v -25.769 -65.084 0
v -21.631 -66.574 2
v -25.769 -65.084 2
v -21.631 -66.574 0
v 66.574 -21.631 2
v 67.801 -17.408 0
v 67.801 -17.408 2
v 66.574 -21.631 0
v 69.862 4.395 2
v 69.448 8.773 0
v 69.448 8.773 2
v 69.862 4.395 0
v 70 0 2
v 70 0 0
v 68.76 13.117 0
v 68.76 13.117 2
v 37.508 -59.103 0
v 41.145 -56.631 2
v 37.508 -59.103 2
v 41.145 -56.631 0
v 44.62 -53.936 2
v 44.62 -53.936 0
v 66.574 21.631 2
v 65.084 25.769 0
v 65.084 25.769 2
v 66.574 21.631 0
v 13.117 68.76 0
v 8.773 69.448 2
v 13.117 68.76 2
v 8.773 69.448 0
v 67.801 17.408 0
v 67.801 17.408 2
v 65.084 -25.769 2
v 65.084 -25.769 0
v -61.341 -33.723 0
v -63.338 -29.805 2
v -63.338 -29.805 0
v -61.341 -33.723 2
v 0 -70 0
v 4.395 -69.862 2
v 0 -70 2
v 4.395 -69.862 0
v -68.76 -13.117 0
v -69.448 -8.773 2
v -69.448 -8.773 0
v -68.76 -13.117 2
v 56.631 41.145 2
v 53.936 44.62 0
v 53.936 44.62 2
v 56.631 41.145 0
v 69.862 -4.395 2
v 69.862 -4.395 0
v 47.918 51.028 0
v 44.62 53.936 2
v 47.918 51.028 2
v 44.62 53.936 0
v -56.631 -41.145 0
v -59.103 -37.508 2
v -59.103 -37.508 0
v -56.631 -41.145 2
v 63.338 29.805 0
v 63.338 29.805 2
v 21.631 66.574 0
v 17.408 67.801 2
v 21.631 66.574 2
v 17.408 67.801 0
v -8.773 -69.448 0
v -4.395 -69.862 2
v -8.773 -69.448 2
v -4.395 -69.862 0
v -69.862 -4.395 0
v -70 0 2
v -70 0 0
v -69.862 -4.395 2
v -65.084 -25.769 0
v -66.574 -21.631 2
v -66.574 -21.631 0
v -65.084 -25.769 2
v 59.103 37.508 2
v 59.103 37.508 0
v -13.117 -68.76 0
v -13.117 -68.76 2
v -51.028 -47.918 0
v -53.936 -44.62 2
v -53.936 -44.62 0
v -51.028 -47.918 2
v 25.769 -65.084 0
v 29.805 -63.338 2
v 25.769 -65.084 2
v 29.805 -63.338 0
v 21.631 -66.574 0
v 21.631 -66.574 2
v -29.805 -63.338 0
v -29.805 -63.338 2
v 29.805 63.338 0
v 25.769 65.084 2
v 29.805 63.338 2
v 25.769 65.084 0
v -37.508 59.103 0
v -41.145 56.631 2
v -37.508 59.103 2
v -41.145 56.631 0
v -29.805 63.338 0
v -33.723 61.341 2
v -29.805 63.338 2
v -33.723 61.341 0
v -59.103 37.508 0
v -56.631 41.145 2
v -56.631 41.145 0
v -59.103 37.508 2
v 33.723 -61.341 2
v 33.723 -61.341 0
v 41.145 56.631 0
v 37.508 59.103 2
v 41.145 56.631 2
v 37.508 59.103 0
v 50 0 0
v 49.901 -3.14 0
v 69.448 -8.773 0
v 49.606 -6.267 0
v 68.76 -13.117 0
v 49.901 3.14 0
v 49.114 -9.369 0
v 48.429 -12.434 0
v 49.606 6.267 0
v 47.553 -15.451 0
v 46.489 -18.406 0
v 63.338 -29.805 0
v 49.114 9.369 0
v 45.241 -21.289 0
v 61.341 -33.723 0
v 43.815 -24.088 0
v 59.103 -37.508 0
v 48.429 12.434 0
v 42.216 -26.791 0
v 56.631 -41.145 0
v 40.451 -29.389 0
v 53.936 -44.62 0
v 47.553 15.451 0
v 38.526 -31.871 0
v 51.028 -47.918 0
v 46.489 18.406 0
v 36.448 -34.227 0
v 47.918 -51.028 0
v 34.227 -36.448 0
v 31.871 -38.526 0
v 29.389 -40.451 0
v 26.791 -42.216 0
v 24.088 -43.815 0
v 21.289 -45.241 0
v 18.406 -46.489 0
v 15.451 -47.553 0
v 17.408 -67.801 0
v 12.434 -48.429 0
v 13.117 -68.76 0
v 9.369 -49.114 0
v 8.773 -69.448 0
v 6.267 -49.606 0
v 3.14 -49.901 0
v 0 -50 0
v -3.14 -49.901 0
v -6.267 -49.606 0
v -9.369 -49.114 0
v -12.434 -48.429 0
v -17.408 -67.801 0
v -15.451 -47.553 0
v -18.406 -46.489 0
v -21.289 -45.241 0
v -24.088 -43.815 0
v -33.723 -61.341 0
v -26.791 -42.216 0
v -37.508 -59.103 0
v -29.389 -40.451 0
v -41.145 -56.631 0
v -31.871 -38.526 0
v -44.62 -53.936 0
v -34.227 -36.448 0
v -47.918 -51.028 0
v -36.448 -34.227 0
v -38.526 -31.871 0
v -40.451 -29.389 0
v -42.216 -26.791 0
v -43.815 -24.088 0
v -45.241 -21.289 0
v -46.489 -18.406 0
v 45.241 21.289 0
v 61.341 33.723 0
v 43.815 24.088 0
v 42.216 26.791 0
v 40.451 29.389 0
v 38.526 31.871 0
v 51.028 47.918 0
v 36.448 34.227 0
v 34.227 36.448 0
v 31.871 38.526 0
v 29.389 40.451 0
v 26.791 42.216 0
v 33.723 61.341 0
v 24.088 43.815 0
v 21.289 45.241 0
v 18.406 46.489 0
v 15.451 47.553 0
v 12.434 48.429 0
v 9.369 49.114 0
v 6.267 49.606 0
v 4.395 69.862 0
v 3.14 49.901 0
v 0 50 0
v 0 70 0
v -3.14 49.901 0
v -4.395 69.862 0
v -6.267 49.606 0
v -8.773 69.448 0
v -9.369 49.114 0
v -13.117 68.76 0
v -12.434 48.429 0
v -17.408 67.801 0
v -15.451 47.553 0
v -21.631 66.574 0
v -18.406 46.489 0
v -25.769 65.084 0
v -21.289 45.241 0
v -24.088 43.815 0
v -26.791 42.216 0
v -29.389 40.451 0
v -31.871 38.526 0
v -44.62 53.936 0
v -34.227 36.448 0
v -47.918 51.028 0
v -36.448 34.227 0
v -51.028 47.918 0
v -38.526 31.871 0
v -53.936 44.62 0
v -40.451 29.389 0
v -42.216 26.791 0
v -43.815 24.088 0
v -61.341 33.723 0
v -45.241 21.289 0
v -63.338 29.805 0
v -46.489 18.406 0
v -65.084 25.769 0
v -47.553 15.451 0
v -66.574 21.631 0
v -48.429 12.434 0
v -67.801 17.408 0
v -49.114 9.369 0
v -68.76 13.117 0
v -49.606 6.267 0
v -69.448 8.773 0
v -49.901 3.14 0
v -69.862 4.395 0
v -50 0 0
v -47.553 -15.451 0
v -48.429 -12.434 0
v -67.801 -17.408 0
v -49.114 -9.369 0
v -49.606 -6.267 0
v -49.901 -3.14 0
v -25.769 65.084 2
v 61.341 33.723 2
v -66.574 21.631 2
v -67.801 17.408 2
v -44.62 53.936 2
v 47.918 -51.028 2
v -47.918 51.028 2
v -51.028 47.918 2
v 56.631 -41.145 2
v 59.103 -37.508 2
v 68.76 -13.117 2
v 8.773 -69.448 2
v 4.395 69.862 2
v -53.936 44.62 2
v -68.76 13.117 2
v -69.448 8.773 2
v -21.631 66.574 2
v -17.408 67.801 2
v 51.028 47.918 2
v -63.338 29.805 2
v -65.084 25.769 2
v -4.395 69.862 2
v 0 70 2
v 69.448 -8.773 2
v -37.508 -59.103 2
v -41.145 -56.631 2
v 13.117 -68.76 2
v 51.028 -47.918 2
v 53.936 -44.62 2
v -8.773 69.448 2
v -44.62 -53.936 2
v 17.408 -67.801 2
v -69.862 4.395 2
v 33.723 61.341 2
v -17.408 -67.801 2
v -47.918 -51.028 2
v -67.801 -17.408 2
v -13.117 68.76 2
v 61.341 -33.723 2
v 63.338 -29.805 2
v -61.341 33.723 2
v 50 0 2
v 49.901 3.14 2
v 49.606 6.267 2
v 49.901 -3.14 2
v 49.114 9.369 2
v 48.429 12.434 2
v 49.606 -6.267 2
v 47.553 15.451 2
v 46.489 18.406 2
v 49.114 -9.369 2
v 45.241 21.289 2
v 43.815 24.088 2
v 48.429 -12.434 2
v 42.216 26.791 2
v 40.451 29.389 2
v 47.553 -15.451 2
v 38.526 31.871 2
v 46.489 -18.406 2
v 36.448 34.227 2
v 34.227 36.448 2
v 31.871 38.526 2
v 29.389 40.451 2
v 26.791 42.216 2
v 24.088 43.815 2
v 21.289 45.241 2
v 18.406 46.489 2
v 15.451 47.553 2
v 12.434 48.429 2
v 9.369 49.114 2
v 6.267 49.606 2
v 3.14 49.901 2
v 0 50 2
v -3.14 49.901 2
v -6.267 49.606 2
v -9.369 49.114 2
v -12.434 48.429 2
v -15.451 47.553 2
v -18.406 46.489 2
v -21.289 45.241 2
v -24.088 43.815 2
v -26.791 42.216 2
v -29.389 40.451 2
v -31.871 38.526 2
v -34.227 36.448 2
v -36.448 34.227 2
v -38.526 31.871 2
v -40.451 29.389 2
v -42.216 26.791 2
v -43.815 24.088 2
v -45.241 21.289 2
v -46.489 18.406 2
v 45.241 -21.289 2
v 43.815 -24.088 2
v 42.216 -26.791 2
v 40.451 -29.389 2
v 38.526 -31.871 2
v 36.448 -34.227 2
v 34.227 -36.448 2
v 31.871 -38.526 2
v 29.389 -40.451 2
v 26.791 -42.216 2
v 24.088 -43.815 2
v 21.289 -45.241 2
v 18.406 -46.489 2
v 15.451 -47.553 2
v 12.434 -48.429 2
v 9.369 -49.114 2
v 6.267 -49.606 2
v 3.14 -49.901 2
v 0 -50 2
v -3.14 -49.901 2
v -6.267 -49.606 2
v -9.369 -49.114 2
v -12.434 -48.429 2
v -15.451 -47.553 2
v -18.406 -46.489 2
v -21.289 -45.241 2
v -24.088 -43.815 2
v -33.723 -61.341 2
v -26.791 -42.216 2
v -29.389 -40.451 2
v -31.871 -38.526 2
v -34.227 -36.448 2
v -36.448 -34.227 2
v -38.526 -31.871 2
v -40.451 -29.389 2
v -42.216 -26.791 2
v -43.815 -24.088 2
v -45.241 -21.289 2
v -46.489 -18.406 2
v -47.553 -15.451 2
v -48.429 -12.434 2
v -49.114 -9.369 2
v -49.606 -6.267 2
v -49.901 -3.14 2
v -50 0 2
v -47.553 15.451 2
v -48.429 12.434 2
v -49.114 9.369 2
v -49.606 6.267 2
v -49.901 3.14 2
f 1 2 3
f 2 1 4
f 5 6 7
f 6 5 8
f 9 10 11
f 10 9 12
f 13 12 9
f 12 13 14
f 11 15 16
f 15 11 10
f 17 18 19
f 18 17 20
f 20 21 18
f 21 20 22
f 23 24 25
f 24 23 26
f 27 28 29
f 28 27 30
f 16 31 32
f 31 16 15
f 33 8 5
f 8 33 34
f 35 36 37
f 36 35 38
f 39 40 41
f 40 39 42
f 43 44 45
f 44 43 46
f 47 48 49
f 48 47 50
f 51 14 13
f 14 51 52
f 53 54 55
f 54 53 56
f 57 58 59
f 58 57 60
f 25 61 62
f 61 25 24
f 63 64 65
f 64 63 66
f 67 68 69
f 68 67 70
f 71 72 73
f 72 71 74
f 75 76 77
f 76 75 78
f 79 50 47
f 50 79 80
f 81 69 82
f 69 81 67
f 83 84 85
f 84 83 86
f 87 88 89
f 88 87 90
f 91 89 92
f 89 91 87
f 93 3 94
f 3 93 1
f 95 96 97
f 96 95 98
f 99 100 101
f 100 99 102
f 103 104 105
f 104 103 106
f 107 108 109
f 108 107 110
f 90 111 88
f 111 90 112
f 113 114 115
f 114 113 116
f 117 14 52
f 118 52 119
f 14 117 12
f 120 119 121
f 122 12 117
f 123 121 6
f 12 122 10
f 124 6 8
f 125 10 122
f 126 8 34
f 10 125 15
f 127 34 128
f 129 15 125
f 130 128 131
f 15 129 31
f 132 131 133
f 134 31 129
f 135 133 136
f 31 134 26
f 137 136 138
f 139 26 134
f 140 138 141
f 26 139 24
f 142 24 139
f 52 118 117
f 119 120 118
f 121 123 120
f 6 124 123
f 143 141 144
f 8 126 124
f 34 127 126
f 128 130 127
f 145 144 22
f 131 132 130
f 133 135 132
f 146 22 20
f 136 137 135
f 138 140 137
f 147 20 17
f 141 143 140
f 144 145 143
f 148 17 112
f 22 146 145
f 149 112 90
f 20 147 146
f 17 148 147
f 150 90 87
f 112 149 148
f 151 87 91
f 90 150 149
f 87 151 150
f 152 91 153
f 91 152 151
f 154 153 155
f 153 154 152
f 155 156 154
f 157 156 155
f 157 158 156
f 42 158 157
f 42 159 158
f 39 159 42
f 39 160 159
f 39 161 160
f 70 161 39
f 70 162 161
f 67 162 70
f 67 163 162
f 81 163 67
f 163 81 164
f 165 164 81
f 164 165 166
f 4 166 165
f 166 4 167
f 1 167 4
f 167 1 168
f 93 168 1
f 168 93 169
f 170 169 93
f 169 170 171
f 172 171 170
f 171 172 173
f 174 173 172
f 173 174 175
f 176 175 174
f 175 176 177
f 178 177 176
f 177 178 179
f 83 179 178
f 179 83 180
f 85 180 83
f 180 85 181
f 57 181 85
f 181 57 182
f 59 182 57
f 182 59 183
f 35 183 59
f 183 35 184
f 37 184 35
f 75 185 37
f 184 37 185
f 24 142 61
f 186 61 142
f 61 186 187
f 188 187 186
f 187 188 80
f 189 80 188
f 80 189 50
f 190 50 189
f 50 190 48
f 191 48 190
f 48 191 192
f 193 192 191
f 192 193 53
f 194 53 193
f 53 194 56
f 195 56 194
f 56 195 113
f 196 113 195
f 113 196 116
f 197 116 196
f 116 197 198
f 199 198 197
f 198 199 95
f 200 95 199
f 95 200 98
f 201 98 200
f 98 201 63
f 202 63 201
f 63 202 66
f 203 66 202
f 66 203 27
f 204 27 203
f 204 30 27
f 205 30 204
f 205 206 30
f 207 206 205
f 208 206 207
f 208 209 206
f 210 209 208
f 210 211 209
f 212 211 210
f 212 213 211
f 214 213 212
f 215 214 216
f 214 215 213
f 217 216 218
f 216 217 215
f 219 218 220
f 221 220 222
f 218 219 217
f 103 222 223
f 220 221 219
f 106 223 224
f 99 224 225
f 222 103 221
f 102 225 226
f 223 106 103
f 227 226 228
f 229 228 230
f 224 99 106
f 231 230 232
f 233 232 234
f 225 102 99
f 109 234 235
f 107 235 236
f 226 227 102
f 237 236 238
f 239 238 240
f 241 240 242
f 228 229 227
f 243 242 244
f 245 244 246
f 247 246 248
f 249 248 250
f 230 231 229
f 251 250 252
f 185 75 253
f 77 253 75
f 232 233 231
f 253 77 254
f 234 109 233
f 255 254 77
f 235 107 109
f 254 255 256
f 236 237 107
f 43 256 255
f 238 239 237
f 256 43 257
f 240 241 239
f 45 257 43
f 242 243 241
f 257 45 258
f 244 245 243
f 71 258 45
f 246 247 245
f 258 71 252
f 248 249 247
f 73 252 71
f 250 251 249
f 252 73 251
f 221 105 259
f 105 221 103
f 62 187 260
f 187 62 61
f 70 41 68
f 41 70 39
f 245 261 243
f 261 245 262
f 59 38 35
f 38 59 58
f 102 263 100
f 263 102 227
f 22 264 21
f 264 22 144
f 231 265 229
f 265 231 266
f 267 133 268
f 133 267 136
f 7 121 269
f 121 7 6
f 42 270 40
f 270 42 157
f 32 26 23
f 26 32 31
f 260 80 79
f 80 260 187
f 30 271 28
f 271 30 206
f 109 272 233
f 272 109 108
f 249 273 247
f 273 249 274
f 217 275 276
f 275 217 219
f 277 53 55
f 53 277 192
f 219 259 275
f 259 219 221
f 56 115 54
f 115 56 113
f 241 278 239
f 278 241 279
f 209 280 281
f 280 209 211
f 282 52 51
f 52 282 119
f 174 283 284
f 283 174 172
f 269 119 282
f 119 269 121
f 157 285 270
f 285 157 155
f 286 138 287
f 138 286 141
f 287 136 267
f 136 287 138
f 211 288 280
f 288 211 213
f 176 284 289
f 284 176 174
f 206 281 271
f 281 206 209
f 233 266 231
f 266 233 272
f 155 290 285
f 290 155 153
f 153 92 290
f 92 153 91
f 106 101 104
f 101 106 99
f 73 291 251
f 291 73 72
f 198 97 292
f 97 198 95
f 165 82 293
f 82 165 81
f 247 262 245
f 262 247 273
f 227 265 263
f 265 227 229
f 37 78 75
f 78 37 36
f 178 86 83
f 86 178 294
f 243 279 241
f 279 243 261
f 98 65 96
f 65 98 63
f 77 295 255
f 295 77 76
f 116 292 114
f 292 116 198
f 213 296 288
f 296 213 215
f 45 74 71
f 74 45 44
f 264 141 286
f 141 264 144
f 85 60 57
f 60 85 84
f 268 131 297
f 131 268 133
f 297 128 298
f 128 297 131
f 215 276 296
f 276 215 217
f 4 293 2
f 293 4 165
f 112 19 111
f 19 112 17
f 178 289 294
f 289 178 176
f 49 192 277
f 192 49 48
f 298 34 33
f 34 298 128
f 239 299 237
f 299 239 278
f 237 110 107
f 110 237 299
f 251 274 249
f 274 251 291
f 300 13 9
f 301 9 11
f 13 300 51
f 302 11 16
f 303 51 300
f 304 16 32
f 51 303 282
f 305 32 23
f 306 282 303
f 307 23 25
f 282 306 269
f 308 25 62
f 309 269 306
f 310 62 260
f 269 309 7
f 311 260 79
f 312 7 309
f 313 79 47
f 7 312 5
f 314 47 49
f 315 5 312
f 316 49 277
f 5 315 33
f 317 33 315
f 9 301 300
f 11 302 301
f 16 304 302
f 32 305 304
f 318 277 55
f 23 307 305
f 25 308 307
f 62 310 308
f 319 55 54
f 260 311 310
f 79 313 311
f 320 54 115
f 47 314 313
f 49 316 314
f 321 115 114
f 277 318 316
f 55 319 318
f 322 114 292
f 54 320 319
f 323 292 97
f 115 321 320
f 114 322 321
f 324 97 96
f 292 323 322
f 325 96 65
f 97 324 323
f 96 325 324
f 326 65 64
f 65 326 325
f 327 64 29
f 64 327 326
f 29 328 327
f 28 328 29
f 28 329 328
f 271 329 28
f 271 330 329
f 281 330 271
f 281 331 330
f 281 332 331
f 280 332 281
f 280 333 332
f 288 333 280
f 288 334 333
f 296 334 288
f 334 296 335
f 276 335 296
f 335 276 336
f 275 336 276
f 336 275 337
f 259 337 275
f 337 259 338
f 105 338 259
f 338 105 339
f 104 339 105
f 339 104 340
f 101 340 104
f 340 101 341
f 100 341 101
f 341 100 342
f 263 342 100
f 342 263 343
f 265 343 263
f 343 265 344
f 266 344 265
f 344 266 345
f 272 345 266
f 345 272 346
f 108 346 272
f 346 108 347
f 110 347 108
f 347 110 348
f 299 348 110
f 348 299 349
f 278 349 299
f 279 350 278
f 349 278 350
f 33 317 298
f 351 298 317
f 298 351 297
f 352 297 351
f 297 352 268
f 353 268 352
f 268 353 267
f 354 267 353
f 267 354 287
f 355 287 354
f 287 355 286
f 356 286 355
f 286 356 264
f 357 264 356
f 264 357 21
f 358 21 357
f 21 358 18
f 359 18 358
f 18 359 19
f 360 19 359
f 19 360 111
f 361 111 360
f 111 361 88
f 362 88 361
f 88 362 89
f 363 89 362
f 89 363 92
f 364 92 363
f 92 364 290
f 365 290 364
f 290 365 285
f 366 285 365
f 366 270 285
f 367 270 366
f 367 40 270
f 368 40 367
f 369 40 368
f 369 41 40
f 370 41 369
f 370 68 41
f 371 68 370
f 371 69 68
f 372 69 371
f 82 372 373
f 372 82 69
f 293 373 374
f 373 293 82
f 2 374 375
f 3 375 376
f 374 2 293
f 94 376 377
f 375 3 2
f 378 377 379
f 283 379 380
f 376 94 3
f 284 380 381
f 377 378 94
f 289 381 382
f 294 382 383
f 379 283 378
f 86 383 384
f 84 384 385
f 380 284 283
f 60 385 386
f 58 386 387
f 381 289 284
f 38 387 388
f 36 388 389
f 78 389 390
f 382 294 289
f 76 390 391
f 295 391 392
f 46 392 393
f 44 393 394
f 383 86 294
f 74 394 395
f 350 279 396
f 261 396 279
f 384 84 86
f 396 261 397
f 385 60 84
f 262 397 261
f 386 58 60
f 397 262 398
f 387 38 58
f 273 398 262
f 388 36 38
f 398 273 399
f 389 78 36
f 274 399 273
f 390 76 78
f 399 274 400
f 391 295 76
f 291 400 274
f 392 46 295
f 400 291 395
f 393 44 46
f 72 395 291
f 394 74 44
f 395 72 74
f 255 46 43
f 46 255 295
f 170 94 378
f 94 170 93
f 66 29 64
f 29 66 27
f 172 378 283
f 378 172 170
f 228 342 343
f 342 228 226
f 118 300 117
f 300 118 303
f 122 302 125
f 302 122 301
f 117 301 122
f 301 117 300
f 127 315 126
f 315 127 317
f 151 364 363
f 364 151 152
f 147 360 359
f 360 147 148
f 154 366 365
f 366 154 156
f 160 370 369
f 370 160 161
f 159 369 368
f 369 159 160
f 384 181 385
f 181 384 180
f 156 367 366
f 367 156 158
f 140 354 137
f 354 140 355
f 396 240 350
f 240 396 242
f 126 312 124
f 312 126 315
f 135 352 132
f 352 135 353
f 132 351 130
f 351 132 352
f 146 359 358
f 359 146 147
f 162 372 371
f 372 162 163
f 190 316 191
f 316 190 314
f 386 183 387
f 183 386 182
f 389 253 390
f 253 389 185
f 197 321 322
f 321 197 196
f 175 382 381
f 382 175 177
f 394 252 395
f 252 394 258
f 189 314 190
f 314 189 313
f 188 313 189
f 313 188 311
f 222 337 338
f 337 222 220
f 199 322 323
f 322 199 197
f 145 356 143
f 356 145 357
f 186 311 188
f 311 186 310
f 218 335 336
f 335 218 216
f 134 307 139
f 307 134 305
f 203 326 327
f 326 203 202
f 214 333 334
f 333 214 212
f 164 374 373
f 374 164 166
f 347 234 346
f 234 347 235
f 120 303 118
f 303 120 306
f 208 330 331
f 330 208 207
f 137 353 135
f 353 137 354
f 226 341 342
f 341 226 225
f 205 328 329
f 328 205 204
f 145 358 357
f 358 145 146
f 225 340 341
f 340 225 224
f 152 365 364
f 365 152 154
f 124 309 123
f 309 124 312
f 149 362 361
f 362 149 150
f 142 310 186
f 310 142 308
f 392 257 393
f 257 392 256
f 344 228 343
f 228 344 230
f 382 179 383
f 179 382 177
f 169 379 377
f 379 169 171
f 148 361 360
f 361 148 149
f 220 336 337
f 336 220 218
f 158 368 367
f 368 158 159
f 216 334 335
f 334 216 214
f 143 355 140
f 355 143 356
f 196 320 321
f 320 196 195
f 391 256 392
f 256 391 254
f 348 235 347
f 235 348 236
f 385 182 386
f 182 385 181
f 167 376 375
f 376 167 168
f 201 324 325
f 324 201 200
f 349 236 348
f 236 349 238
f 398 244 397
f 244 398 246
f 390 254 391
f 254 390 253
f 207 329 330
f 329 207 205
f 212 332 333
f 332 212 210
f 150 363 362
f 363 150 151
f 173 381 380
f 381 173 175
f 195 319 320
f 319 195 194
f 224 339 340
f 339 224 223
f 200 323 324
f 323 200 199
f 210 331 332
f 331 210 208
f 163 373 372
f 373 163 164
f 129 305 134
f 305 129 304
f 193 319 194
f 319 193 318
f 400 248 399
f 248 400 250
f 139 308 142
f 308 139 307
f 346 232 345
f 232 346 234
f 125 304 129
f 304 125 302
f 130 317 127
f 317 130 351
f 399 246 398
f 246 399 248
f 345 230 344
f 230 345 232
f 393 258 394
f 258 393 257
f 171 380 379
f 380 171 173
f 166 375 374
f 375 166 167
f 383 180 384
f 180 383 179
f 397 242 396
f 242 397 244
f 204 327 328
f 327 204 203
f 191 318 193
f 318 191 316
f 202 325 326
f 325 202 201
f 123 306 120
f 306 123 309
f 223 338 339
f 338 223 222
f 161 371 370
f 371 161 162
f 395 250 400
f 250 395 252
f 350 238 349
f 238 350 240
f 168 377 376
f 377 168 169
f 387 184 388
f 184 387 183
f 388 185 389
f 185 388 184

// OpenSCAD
//Weighted ring for paper
$fn=100;
//The variables below can be adjusted if desired
depth=2;       //depth (weight) of ring
inner=100;       //inner hole diameter of ring
outer=140;      //outer diameter of ring
difference(){
union(){
//main disk
cylinder(h=depth, d1=outer, d2=outer);
}
//hole in middle
translate([0,0,-1])  
cylinder(h=depth+2,d1=inner,d2=inner);
}
